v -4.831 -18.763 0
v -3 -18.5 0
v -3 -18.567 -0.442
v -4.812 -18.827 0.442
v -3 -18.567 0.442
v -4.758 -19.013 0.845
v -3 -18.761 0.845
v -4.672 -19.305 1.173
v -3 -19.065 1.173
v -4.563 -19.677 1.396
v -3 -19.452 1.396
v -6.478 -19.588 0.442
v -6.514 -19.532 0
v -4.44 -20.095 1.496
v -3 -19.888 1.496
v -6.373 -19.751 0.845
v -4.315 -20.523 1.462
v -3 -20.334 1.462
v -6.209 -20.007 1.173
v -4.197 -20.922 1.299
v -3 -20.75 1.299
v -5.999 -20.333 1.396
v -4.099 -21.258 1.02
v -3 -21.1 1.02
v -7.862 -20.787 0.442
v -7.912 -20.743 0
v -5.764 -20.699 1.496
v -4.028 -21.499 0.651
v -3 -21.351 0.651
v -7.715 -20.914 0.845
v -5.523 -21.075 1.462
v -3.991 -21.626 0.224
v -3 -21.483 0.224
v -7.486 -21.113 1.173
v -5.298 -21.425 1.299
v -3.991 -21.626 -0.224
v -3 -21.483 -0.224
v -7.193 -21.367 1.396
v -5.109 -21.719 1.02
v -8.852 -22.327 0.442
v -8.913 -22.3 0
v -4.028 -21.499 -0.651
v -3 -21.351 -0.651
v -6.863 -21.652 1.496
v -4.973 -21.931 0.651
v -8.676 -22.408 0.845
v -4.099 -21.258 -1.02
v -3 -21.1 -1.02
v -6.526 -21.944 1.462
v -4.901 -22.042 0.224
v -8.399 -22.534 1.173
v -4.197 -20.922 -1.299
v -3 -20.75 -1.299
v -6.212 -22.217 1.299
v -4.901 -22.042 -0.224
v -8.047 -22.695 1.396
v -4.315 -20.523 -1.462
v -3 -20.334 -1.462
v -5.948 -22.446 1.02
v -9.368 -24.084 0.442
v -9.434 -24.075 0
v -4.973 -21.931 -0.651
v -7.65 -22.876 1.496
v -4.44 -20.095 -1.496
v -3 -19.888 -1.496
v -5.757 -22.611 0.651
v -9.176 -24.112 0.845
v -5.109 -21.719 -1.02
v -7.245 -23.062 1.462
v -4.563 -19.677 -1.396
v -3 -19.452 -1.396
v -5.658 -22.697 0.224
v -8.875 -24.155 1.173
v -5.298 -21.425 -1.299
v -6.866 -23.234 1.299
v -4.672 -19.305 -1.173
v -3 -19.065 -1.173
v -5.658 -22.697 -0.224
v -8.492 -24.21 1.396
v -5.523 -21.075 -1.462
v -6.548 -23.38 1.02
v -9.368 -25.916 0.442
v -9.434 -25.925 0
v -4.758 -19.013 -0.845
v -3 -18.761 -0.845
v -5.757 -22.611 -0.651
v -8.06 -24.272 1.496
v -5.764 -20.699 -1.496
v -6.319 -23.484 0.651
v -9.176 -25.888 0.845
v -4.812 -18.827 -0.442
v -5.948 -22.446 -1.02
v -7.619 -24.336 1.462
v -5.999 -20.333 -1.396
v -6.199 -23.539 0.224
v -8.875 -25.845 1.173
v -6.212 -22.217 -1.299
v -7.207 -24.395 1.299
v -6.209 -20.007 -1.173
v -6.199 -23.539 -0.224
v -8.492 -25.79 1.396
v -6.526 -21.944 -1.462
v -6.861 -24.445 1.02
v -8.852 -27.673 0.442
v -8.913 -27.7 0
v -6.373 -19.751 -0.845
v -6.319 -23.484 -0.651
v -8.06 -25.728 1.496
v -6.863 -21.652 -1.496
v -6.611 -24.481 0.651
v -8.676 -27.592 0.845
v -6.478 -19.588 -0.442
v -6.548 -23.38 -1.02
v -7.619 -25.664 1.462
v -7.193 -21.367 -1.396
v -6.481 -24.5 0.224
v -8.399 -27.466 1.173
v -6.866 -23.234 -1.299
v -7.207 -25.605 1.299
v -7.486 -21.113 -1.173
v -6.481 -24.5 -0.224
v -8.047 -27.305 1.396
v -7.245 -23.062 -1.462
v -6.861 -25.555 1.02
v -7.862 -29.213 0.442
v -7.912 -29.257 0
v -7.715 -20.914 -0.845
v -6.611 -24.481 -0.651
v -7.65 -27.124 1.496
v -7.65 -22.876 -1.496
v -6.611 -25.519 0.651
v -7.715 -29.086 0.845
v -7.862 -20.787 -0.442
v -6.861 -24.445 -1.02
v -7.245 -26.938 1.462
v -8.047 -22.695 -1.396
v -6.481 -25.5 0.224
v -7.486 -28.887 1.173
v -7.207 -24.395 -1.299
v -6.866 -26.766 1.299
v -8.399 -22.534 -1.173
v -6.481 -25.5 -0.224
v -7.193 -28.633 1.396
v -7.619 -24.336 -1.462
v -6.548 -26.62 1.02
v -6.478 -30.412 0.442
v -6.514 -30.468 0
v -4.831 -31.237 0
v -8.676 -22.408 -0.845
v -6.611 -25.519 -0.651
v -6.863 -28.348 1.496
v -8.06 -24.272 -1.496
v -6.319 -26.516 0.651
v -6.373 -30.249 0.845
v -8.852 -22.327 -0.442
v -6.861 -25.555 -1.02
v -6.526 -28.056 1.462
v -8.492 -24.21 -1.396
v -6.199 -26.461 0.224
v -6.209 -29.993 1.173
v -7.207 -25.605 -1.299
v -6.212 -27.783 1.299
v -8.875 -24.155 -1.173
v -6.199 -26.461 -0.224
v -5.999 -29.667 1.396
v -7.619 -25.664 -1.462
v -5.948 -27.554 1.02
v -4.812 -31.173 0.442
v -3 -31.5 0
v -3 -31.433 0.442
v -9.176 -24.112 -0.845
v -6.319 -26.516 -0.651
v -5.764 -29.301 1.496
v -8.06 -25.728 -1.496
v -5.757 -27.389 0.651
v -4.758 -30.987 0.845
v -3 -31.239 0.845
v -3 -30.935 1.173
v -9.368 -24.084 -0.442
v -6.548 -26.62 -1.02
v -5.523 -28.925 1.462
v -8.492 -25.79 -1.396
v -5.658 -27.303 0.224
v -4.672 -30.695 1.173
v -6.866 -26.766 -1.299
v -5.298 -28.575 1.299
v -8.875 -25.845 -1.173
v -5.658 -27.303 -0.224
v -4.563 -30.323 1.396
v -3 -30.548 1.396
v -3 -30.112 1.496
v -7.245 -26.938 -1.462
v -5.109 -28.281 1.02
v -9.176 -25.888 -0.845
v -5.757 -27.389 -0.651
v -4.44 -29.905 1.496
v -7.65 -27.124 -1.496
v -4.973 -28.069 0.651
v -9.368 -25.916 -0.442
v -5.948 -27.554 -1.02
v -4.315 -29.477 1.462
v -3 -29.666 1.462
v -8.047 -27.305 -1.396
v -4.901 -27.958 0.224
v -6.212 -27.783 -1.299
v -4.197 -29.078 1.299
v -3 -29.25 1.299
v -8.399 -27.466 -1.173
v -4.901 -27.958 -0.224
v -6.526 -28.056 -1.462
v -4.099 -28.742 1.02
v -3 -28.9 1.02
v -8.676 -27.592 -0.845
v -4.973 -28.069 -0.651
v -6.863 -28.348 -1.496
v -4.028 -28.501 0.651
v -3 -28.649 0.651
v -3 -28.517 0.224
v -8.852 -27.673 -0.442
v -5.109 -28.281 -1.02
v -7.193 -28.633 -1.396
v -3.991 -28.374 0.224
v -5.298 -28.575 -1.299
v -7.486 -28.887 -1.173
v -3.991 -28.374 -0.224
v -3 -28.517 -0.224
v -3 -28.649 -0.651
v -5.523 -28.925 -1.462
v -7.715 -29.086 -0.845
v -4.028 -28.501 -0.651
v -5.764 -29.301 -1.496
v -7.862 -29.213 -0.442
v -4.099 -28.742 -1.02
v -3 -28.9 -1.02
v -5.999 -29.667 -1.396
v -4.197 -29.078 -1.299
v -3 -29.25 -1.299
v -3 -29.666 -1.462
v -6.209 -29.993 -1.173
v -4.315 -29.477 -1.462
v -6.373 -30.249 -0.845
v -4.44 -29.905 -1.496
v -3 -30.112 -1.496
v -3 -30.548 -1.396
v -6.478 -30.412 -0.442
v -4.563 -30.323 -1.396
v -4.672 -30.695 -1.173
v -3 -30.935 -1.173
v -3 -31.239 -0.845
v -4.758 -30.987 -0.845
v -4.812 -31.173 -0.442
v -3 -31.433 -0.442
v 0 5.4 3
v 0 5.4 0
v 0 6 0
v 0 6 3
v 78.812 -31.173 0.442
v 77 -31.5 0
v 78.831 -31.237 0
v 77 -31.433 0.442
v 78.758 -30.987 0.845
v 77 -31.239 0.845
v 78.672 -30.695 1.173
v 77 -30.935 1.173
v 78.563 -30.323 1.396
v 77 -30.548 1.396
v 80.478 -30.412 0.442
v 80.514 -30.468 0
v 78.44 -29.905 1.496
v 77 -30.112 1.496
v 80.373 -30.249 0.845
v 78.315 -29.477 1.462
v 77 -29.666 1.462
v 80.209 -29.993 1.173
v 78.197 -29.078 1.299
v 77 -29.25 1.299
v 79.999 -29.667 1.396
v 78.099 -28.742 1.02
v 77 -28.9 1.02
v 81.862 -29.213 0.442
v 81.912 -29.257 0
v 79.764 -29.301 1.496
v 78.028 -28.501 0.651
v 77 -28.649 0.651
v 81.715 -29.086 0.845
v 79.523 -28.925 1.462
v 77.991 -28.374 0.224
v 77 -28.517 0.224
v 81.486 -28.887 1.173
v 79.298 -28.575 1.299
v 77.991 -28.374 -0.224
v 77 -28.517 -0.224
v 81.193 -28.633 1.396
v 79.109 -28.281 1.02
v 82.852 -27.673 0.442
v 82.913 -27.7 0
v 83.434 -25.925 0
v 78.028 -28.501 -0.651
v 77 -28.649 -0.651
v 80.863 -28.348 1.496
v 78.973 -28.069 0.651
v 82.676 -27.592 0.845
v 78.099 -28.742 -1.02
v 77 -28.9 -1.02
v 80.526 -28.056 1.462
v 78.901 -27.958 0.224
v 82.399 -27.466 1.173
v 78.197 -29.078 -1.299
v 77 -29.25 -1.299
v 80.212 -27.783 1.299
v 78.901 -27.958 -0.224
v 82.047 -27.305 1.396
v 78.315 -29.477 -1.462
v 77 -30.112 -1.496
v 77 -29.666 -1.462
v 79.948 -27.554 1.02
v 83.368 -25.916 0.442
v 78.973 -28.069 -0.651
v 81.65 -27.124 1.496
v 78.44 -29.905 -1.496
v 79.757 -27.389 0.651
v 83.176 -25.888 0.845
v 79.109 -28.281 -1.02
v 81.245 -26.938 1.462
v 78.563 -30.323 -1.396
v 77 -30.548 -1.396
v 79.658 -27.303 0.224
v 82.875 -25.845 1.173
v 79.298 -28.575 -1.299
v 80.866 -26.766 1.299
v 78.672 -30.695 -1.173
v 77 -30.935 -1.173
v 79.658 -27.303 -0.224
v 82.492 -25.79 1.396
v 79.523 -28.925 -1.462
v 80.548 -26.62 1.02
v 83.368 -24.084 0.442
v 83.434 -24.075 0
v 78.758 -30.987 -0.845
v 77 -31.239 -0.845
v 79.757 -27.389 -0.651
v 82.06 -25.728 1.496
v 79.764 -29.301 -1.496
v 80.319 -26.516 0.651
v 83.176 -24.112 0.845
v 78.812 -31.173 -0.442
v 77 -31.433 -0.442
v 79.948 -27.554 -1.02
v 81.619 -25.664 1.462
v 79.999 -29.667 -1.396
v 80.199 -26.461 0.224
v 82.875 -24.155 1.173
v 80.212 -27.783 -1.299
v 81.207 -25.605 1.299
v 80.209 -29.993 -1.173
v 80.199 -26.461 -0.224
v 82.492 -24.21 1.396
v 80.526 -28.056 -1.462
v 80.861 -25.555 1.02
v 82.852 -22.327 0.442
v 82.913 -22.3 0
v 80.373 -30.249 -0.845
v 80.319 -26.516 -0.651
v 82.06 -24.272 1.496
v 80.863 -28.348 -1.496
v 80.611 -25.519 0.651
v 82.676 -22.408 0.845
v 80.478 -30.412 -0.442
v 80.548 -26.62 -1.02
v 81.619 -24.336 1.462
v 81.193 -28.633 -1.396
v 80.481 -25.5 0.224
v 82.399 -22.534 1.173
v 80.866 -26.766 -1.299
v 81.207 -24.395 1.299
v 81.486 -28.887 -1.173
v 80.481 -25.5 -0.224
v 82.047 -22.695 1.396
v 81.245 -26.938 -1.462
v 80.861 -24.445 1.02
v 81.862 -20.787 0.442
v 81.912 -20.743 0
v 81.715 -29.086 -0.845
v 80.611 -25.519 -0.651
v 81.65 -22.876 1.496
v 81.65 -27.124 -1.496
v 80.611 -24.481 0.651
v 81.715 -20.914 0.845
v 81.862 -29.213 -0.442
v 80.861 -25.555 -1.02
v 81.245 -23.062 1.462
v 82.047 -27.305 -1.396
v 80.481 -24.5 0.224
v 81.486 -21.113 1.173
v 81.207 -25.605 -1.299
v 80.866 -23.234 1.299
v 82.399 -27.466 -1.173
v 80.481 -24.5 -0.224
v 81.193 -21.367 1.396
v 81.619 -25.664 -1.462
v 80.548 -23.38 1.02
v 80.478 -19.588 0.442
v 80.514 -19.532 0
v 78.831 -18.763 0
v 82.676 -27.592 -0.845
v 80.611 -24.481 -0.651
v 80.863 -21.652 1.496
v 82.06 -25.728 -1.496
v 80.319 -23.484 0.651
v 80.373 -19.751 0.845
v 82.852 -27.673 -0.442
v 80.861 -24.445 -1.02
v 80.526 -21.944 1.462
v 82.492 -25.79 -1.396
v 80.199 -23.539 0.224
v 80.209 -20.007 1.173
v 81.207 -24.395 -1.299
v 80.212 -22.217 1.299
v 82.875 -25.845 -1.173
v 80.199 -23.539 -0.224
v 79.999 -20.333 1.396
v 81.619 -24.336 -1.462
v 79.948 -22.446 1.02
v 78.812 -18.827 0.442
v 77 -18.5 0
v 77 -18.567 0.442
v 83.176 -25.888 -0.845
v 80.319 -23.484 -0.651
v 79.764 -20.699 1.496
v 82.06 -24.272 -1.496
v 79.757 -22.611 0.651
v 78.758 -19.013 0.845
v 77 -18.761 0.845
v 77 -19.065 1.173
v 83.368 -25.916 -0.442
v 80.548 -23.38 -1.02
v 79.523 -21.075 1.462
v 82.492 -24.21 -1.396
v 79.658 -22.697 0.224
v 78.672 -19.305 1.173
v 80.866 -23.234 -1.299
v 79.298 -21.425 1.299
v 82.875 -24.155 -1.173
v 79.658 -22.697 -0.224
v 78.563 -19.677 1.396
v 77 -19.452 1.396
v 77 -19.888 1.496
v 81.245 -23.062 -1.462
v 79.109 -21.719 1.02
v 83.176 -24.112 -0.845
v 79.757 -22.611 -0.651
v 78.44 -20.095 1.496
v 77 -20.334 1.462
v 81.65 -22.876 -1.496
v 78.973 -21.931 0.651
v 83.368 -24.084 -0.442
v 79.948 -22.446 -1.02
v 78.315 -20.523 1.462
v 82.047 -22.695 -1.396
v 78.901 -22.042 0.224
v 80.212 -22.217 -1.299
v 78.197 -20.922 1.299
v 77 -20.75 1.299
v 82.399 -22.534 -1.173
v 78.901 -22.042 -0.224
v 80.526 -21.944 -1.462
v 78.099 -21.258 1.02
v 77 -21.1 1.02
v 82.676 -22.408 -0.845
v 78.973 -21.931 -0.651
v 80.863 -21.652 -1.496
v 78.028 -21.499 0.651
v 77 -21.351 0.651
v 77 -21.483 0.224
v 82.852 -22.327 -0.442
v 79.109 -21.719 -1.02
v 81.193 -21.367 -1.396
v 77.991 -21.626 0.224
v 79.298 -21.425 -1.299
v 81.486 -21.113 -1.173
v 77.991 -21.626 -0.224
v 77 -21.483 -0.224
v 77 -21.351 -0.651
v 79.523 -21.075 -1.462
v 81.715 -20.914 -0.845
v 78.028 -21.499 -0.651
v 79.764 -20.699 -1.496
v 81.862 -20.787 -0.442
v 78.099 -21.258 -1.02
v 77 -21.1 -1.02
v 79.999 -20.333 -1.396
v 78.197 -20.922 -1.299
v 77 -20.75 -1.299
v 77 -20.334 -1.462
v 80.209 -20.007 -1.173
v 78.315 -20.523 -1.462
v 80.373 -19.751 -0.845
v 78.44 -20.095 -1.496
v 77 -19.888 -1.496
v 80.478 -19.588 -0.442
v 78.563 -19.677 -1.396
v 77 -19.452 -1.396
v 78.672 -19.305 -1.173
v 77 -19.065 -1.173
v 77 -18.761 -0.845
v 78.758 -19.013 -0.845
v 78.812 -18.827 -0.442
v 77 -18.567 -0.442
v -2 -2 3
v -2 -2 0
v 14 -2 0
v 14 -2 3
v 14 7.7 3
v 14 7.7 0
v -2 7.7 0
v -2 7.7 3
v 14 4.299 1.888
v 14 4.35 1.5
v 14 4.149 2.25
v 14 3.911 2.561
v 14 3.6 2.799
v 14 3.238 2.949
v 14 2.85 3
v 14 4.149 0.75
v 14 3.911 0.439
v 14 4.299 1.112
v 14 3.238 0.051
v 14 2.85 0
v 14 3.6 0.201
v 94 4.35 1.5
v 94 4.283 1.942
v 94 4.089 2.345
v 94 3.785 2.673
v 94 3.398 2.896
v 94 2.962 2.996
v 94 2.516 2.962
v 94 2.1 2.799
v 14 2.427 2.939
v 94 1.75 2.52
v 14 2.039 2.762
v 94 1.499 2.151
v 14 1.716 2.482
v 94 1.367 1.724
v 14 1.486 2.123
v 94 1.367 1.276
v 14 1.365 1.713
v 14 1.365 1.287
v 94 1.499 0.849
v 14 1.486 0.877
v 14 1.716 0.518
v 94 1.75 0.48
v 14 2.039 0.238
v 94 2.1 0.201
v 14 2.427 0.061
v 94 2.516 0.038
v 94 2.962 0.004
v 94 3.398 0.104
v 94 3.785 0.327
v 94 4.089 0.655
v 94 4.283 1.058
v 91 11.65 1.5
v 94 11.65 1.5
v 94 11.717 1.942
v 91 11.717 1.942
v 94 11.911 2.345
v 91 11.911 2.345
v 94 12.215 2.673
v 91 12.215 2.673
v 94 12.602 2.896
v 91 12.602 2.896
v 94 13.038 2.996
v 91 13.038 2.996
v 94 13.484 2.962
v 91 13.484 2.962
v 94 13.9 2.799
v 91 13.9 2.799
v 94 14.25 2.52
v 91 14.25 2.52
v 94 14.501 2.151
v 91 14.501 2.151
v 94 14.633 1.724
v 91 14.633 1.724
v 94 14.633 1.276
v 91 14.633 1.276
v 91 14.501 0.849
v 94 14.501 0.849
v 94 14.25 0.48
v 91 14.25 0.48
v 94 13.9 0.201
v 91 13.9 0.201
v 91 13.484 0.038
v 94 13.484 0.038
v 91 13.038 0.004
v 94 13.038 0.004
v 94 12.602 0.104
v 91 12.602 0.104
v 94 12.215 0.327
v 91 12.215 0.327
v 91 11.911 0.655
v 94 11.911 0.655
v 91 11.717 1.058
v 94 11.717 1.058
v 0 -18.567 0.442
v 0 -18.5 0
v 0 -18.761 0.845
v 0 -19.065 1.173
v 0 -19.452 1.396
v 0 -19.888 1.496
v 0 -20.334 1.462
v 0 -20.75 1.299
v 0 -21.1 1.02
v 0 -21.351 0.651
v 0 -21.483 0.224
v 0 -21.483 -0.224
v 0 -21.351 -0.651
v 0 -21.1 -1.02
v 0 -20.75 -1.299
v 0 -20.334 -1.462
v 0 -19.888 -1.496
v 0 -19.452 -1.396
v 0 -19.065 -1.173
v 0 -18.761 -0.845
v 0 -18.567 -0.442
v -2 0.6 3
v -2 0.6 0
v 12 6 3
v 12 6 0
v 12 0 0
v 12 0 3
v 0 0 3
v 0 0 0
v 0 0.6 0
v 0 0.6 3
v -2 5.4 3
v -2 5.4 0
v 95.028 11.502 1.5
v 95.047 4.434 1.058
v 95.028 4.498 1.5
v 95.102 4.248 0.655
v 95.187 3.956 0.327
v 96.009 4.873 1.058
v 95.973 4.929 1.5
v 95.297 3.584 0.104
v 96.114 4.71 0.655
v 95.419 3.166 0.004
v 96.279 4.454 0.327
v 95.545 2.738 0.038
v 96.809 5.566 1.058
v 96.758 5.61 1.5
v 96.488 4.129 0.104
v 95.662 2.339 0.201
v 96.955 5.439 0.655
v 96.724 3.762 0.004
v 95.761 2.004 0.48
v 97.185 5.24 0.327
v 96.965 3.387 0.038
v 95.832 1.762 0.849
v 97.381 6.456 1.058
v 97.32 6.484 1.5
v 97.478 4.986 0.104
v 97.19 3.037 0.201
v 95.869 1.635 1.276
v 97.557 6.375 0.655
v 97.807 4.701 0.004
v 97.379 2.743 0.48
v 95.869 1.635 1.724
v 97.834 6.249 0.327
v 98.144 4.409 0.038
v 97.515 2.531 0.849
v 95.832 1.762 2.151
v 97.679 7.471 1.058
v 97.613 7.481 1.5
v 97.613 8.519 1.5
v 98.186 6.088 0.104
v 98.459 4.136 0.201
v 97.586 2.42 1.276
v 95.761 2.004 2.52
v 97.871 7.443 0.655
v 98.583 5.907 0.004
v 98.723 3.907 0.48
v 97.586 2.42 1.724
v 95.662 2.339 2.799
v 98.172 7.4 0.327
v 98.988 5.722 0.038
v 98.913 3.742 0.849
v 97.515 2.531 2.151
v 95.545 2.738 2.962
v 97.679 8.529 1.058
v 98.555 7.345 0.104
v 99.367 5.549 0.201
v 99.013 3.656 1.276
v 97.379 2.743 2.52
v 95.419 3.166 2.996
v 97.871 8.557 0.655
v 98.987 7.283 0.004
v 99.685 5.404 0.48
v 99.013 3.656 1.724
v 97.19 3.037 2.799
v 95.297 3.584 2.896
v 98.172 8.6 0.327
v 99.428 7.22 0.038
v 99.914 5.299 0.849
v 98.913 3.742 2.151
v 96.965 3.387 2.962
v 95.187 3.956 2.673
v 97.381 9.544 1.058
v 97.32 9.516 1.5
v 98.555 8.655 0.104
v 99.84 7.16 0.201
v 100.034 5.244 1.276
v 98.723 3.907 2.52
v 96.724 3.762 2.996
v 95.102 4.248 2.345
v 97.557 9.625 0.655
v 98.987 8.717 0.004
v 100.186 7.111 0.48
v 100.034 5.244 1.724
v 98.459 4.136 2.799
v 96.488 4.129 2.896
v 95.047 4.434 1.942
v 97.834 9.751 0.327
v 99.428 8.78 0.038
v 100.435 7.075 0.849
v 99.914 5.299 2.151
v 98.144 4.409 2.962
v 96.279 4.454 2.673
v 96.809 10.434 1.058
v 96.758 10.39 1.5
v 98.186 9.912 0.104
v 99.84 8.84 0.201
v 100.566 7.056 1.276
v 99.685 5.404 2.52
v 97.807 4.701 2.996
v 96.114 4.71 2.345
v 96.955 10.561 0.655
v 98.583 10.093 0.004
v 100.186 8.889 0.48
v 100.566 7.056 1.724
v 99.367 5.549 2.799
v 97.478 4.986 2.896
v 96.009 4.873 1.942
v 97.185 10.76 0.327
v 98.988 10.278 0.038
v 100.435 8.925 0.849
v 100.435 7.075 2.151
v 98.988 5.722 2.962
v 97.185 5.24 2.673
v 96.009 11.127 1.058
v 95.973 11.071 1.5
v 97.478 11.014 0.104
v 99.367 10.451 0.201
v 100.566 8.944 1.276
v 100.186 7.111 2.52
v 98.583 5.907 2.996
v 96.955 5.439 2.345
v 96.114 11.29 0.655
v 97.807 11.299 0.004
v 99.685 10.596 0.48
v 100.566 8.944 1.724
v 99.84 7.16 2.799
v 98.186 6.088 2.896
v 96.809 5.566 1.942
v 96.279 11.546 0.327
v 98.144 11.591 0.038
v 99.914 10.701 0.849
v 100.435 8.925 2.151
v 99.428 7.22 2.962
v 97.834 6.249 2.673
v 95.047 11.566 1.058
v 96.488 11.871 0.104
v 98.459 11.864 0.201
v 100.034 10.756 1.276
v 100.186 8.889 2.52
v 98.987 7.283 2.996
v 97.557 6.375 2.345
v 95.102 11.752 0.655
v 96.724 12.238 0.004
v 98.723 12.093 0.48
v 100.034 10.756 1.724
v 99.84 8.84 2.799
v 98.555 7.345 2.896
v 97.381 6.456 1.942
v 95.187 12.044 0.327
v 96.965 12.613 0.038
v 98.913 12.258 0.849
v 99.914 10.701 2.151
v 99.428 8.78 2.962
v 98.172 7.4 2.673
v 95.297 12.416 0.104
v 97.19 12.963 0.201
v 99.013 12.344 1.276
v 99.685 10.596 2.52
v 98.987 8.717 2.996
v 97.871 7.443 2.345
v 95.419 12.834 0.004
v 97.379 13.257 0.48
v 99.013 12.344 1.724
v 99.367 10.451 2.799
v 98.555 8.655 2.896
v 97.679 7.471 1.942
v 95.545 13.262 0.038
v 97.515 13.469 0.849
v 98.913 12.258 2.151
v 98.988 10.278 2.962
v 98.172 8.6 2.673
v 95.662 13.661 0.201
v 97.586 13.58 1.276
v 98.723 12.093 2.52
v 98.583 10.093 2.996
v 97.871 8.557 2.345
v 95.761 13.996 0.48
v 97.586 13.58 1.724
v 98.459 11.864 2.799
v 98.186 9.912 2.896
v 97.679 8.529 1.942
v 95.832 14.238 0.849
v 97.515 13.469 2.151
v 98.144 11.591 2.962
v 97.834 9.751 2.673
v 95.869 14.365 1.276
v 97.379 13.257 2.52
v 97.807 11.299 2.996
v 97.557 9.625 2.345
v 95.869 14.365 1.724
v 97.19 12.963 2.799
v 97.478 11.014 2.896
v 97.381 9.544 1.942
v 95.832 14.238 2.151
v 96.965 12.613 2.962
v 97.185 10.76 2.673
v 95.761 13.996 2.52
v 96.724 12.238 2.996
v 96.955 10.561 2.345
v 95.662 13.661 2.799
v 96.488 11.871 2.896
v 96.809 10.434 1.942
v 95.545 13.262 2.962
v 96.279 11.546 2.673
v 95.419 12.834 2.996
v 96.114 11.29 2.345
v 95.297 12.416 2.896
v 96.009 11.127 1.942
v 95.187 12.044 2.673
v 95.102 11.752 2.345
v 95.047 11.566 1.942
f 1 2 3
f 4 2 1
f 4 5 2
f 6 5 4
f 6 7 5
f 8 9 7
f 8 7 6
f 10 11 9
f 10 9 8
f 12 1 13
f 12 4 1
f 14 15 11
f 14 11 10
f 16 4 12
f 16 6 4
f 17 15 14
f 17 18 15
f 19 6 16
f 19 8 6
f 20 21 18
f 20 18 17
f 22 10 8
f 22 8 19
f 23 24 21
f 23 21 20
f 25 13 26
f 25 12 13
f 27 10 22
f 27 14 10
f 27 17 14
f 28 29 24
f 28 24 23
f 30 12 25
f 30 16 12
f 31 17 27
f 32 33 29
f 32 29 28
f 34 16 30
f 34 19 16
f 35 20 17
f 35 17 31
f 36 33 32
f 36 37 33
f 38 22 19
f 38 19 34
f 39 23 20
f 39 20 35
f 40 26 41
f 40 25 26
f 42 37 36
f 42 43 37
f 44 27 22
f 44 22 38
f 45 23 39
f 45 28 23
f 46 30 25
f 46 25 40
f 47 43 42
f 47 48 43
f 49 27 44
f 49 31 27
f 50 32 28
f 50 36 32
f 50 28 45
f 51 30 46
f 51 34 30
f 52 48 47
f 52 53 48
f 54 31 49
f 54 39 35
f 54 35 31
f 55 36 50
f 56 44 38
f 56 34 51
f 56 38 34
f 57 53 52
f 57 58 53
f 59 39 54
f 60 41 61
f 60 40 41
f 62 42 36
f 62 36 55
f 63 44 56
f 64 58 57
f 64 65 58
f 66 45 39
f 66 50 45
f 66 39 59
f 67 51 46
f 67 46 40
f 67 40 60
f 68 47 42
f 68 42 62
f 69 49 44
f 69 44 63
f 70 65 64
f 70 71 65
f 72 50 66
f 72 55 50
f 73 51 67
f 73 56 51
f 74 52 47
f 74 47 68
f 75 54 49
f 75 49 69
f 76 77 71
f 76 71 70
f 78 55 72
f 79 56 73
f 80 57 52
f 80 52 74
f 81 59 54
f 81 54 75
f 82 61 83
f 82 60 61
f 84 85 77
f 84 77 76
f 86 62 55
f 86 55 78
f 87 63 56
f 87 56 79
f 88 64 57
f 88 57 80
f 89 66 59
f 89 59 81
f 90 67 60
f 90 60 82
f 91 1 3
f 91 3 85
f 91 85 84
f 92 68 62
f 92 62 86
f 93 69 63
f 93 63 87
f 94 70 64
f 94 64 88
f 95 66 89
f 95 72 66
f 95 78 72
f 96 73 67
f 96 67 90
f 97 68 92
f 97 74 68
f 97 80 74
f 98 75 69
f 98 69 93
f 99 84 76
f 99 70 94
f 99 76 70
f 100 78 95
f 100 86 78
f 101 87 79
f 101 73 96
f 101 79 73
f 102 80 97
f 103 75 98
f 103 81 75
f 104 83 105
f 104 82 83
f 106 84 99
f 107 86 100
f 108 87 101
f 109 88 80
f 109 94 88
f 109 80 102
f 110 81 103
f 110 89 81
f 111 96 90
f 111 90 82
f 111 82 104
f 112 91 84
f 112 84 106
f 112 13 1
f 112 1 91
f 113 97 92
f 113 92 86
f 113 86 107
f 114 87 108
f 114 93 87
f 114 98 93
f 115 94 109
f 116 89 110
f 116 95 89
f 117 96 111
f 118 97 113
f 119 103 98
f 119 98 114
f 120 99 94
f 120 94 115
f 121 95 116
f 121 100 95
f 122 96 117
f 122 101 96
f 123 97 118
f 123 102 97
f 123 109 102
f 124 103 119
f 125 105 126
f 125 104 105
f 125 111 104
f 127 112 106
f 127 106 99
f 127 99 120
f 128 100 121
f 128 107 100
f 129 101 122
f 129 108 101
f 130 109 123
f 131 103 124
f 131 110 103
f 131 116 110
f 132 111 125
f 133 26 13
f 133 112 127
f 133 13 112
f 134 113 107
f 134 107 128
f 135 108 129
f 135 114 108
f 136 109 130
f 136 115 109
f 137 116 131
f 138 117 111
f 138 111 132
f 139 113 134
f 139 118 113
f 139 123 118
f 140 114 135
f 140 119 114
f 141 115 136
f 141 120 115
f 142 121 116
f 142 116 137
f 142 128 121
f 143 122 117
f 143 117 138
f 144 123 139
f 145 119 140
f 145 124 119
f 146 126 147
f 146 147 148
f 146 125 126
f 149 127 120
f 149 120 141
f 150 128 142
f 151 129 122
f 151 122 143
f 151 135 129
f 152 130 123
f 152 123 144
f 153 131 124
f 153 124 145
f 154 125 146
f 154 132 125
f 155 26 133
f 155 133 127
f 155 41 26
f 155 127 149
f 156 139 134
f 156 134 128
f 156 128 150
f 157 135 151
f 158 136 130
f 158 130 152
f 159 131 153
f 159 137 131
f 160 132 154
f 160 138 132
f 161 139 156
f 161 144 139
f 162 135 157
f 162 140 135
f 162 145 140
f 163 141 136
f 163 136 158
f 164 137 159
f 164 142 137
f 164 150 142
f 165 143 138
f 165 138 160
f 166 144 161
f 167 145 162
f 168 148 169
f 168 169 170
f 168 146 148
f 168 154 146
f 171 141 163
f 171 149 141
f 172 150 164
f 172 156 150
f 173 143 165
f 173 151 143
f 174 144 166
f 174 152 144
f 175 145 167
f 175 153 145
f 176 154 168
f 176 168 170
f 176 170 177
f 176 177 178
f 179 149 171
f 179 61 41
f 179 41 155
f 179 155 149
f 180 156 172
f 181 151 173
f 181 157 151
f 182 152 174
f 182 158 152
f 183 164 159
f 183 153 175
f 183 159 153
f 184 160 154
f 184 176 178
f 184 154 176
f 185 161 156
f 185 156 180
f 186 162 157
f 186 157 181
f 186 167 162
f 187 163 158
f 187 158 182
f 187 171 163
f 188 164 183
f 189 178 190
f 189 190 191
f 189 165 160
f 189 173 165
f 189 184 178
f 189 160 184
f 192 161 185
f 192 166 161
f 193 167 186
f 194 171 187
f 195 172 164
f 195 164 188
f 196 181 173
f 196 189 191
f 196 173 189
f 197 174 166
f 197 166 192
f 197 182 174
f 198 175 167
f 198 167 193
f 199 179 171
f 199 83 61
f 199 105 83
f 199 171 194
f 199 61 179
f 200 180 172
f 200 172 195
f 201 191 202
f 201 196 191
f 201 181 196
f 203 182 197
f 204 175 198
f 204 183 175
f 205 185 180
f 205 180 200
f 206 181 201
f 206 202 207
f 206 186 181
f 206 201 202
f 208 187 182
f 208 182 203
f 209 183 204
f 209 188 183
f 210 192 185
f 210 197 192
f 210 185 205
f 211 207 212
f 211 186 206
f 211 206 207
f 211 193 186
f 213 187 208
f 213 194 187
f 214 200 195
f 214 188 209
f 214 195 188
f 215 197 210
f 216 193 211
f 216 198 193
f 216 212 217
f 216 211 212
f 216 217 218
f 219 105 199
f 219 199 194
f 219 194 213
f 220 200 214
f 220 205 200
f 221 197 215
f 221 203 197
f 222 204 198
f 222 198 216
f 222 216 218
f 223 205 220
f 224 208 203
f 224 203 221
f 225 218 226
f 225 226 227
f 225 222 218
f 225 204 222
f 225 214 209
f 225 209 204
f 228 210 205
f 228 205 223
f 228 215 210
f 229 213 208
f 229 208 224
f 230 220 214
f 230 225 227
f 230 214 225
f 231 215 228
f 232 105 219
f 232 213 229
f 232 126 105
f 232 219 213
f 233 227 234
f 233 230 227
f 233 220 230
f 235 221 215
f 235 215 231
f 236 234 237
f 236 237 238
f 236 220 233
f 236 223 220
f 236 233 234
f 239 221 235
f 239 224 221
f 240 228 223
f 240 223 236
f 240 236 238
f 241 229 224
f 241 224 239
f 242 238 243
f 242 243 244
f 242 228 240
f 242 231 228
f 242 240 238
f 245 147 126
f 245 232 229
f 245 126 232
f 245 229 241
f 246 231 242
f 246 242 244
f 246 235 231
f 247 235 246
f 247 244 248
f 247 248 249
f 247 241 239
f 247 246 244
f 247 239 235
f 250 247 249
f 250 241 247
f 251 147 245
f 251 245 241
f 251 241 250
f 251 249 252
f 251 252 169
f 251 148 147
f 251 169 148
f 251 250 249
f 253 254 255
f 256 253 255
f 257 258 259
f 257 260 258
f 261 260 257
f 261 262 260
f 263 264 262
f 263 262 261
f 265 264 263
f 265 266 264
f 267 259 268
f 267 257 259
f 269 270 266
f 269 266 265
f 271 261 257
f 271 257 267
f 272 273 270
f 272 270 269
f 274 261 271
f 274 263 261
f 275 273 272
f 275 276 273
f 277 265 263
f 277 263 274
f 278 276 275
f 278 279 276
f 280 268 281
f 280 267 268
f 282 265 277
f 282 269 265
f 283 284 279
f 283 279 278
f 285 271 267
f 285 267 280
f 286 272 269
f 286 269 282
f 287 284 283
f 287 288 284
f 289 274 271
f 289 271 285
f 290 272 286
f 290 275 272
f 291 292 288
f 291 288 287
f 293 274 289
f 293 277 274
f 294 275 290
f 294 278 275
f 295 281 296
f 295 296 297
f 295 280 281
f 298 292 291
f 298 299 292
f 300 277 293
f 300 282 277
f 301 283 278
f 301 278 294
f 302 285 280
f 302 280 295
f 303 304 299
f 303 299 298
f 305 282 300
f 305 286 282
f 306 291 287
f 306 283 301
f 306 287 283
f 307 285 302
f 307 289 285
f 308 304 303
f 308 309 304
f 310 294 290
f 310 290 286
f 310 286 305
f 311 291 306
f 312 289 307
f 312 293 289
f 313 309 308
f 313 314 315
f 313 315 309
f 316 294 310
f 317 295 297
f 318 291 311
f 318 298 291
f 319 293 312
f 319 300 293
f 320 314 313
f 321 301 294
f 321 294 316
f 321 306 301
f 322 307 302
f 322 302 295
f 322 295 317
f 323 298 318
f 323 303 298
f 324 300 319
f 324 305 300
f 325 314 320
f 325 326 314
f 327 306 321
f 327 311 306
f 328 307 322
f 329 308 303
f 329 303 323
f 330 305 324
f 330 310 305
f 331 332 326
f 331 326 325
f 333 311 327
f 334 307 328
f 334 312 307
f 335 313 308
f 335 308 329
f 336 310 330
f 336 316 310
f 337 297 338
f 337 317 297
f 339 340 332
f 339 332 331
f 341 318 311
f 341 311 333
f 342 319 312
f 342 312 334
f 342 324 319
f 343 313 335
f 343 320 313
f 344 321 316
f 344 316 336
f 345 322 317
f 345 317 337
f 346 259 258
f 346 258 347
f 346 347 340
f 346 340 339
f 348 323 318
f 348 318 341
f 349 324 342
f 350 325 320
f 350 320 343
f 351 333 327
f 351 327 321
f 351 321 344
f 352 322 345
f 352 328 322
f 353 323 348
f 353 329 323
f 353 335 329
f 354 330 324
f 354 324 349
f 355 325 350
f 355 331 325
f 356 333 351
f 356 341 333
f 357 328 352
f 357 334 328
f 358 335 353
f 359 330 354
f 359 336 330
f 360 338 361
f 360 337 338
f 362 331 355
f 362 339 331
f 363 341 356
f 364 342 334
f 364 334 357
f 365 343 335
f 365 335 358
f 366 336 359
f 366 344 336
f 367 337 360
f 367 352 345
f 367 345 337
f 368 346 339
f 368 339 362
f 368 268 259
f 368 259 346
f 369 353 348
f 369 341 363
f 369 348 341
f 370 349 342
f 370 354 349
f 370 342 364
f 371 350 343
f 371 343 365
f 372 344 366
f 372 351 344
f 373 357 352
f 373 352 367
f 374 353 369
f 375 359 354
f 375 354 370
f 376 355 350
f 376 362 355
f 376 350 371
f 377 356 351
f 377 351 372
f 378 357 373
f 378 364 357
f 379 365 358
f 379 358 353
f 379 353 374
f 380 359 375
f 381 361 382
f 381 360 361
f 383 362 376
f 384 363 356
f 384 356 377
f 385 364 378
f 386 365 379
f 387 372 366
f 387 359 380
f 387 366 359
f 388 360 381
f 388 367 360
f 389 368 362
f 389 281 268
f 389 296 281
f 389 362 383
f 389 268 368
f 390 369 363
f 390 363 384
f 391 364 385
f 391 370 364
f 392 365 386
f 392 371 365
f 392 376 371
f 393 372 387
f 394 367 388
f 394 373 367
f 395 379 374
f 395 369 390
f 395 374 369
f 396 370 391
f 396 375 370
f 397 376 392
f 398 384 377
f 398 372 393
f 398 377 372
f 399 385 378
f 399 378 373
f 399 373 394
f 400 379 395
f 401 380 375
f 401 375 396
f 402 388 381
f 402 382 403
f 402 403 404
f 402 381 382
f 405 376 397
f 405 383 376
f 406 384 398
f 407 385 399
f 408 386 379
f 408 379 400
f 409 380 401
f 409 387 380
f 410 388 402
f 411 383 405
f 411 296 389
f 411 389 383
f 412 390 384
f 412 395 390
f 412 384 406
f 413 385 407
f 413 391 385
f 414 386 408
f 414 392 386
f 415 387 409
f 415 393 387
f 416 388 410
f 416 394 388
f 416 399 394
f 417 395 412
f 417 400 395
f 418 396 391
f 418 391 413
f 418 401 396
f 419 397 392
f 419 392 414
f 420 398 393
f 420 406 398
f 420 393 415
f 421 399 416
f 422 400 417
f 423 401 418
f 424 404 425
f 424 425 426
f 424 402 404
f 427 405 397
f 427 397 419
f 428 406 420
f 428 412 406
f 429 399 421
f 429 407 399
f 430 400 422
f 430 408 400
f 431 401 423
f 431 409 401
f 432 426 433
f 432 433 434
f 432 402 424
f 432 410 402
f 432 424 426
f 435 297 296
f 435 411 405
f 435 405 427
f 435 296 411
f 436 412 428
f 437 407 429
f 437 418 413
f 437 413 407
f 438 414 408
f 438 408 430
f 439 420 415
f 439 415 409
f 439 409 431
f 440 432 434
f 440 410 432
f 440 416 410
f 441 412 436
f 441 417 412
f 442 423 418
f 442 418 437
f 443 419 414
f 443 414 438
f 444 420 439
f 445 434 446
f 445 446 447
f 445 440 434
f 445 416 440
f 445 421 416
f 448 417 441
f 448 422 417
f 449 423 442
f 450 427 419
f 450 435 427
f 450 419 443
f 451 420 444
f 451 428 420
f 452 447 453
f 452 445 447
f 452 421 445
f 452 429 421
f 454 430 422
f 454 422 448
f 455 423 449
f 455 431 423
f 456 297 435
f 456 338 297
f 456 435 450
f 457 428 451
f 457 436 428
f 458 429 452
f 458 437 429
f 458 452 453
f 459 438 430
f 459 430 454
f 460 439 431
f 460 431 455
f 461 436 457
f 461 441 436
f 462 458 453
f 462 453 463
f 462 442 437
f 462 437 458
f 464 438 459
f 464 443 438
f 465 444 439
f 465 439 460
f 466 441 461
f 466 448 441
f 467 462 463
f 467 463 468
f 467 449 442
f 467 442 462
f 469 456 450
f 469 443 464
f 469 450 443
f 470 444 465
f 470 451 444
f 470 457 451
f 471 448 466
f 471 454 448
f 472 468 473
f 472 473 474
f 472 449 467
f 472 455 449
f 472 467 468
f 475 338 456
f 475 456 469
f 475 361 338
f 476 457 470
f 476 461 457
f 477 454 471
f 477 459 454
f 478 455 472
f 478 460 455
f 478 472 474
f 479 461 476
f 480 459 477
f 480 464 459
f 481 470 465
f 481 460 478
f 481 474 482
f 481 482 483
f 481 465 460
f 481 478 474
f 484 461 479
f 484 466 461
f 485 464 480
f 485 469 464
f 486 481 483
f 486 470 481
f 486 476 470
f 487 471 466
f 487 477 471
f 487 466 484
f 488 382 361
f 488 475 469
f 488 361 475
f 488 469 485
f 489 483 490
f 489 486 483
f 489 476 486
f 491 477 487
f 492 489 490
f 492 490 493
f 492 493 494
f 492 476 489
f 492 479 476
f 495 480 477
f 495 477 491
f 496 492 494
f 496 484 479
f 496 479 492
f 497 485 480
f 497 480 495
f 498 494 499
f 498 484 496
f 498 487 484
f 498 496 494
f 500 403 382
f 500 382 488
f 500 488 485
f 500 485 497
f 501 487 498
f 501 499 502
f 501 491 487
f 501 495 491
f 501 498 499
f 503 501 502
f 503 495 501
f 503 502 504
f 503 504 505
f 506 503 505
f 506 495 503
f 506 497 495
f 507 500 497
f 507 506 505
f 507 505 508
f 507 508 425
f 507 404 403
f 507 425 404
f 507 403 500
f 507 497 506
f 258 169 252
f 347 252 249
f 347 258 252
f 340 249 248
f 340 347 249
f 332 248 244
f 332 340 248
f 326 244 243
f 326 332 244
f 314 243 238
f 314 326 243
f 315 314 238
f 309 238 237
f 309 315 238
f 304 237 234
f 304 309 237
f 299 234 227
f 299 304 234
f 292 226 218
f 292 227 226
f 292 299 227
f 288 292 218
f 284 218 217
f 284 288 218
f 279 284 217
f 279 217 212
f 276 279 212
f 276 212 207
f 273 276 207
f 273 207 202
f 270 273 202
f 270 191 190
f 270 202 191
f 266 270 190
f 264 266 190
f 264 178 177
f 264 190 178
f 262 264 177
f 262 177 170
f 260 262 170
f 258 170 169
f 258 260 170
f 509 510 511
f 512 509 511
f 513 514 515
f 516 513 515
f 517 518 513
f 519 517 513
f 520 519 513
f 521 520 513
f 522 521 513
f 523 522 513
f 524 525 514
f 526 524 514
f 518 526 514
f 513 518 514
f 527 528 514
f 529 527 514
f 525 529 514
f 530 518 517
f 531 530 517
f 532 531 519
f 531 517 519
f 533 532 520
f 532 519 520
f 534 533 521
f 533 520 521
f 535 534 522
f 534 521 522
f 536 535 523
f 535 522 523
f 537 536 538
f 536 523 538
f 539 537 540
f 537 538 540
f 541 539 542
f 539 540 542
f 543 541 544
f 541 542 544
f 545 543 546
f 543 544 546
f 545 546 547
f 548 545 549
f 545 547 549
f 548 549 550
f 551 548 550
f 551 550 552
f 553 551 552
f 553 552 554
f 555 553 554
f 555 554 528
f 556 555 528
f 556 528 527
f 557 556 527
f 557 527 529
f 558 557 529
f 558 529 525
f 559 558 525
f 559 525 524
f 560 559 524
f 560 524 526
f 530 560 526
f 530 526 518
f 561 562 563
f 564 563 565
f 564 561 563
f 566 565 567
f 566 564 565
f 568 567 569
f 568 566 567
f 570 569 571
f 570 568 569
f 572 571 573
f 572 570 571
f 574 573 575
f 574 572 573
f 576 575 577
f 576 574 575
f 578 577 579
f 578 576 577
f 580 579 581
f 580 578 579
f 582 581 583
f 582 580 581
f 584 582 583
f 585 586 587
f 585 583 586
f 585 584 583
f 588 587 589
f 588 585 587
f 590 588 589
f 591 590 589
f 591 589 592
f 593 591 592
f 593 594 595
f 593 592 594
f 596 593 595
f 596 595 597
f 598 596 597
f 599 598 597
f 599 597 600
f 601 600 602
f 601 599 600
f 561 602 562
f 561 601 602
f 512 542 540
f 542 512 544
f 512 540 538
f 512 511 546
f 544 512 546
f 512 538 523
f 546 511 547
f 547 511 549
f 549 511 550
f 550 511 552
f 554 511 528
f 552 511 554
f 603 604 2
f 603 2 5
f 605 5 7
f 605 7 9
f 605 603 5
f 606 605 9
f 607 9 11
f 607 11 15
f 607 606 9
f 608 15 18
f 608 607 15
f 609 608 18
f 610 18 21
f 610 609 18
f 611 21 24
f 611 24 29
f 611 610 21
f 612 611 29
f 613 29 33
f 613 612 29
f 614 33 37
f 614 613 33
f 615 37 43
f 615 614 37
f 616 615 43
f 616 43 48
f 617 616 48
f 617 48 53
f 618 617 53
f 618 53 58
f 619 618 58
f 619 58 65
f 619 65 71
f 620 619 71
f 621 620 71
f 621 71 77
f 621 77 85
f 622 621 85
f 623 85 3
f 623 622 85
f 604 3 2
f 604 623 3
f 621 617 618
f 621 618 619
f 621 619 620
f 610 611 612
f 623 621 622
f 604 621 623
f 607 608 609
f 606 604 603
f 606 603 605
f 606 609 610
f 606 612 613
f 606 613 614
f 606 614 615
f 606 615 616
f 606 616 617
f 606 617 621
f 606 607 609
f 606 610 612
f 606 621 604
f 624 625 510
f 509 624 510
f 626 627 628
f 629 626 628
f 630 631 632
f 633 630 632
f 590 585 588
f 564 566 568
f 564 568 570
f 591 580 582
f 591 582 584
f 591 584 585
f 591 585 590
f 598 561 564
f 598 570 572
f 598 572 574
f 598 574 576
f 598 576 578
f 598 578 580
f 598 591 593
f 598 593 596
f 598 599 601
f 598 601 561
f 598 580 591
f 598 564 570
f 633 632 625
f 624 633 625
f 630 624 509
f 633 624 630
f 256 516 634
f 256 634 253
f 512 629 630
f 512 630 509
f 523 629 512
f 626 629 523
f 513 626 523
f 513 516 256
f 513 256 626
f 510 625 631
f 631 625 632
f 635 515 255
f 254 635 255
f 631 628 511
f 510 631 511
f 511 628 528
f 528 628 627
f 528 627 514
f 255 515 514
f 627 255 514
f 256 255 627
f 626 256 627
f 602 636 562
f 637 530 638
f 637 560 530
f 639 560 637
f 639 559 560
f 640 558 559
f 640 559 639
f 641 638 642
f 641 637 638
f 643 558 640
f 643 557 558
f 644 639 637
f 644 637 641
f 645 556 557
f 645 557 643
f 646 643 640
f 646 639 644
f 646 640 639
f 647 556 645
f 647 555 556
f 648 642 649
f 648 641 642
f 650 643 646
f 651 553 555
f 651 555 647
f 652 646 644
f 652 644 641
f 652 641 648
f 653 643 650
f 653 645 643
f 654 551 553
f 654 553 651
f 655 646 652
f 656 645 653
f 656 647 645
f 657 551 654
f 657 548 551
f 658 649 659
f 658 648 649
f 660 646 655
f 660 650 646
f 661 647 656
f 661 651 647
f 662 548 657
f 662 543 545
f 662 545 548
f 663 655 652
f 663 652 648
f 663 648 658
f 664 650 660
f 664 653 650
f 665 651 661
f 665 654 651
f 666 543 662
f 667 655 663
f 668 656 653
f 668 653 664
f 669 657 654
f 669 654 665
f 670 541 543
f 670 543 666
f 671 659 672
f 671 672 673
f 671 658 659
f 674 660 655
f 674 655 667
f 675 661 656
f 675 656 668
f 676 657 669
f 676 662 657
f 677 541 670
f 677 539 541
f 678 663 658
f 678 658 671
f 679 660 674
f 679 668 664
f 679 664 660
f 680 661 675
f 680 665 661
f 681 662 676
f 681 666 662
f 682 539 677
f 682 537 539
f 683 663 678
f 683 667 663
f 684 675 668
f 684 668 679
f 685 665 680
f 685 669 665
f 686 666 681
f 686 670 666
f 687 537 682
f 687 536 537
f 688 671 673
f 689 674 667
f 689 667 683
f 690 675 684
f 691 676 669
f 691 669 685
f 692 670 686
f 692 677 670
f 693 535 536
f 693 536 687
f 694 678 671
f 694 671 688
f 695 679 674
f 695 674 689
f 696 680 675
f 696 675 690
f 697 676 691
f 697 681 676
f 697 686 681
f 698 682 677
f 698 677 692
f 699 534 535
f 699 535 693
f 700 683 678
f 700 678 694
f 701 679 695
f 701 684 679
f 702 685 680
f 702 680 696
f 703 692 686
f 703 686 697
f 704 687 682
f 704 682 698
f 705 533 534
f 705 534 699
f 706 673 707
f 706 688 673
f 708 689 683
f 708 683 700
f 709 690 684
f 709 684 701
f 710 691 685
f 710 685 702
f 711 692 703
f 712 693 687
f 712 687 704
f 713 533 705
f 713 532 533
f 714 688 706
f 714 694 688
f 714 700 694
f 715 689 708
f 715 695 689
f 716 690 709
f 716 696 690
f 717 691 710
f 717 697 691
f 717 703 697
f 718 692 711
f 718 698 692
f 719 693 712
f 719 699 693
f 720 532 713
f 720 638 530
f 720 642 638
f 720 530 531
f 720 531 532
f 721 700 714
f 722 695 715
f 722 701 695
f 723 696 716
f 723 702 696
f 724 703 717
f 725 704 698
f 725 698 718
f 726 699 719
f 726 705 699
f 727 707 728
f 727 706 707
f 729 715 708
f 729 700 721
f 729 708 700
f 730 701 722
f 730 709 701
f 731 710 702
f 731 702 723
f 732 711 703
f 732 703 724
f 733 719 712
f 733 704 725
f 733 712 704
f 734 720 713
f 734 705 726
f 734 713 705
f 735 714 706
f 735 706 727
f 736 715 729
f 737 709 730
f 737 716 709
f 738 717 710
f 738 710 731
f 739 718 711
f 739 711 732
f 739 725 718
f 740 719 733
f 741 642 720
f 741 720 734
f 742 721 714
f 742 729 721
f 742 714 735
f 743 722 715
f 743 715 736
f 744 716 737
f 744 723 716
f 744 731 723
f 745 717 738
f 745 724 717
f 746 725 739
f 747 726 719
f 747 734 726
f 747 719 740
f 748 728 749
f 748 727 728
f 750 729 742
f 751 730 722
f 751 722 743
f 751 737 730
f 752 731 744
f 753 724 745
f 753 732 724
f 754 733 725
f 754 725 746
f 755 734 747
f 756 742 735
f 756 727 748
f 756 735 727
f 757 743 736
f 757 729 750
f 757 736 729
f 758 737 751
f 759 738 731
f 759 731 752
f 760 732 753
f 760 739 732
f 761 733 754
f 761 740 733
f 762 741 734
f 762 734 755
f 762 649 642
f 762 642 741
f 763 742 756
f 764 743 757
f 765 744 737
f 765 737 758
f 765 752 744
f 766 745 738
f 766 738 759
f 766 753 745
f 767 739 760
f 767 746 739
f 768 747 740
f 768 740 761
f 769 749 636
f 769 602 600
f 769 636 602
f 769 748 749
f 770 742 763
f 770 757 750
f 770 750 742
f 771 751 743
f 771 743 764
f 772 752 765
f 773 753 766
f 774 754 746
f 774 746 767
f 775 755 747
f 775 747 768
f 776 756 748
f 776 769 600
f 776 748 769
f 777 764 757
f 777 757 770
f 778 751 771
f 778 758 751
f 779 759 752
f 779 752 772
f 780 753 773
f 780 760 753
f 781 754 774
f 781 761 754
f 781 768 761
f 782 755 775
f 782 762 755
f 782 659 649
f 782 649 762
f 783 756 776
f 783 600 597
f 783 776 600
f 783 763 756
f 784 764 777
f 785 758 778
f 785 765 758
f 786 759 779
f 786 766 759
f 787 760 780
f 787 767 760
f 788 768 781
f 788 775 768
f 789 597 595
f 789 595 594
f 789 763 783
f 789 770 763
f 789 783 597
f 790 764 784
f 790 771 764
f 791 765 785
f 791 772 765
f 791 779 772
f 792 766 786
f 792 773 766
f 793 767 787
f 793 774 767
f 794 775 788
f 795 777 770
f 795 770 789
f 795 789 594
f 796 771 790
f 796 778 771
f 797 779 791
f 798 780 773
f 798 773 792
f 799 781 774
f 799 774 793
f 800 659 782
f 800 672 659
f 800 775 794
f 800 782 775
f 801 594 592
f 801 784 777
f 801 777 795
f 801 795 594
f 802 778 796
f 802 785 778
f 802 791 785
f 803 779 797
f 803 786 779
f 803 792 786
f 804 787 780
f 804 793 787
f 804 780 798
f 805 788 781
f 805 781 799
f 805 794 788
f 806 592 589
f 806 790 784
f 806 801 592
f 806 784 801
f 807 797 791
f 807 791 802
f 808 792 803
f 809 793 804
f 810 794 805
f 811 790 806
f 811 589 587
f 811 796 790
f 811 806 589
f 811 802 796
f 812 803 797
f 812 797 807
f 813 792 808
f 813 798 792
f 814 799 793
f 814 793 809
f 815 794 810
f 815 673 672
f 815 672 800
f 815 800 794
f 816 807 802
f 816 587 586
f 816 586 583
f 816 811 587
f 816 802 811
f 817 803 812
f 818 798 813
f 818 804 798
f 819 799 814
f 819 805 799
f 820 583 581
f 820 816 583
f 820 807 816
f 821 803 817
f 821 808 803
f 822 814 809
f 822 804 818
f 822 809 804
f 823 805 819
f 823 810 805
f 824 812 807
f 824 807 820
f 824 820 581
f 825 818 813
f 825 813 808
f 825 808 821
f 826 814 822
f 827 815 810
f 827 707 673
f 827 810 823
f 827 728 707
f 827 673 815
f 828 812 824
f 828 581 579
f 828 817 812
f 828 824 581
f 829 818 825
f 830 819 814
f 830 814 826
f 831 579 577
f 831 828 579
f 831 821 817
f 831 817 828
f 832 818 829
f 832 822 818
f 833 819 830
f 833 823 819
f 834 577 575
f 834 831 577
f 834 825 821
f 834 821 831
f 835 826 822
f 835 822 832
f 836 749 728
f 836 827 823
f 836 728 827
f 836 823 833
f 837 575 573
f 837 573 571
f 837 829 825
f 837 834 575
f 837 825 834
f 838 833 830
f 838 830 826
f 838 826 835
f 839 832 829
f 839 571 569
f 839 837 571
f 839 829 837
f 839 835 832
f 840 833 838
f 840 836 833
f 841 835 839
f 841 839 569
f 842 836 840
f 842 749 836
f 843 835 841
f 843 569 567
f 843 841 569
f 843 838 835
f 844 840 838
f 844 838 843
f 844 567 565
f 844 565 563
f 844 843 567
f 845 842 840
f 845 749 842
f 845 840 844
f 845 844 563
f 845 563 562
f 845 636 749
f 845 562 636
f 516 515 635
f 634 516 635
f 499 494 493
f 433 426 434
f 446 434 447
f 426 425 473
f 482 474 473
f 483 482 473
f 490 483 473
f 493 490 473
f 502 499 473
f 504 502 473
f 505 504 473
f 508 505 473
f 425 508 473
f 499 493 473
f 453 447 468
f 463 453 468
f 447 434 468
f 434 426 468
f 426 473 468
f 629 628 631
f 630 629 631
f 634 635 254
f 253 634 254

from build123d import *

# Parameters (mm, degrees)
F1_DEPTH  = 3
F2_R      = 1.5
F3_DEPTH  = 80
F4_R      = 1.5
F9_R      = 1.5
F10_DEPTH = 3


with BuildPart() as f1:
    # F0 (on Top) → F1 (new body)
    with BuildSketch(Plane.XY):
        Polygon((12, 0), (0, 0), (0, 0.6), (-2, 0.6), (-2, -2), (14, -2), (14, 7.7), (-2, 7.7), (-2, 5.4), (0, 5.4), (0, 6), (12, 6), align=None)
    extrude(amount=F1_DEPTH)

    # F2 (on face) → F3 (join)
    with BuildSketch(Plane.YZ.offset(14)):
        with Locations((2.85, 1.5)):
            Circle(F2_R)
    extrude(amount=F3_DEPTH)

    # F7: sweep along a path in F6
    with BuildLine(Plane.XY.offset(1.5)) as f7_path:
        ThreePointArc((94, 3), (99, 8), (94, 13))
        Line((94, 13), (91, 13))
    # F4 (on face) → F7 (sweep)
    with BuildSketch(Plane.YZ.offset(94)):
        with Locations((2.85, 1.5)):
            Circle(F4_R)
    sweep(path=f7_path.line)


with BuildPart() as f10:
    # F9 (on Right) → F10 (new body)
    with BuildSketch(Plane.YZ):
        with Locations((-20, 0)):
            Circle(F9_R)
    extrude(amount=-F10_DEPTH)

    # F11: sweep along a path in F8
    with BuildLine(Plane.XY) as f11_path:
        Line((0, -20), (-3, -20))
        ThreePointArc((-3, -20), (-8, -25), (-3, -30))
        Line((-3, -30), (77, -30))
        ThreePointArc((77, -30), (82, -25), (77, -20))
    # F9 (on Right) → F11 (sweep)
    with BuildSketch(Plane.YZ):
        with Locations((-20, 0)):
            Circle(F9_R)
    sweep(path=f11_path.line)


solid = Compound([f1.part, f10.part])
